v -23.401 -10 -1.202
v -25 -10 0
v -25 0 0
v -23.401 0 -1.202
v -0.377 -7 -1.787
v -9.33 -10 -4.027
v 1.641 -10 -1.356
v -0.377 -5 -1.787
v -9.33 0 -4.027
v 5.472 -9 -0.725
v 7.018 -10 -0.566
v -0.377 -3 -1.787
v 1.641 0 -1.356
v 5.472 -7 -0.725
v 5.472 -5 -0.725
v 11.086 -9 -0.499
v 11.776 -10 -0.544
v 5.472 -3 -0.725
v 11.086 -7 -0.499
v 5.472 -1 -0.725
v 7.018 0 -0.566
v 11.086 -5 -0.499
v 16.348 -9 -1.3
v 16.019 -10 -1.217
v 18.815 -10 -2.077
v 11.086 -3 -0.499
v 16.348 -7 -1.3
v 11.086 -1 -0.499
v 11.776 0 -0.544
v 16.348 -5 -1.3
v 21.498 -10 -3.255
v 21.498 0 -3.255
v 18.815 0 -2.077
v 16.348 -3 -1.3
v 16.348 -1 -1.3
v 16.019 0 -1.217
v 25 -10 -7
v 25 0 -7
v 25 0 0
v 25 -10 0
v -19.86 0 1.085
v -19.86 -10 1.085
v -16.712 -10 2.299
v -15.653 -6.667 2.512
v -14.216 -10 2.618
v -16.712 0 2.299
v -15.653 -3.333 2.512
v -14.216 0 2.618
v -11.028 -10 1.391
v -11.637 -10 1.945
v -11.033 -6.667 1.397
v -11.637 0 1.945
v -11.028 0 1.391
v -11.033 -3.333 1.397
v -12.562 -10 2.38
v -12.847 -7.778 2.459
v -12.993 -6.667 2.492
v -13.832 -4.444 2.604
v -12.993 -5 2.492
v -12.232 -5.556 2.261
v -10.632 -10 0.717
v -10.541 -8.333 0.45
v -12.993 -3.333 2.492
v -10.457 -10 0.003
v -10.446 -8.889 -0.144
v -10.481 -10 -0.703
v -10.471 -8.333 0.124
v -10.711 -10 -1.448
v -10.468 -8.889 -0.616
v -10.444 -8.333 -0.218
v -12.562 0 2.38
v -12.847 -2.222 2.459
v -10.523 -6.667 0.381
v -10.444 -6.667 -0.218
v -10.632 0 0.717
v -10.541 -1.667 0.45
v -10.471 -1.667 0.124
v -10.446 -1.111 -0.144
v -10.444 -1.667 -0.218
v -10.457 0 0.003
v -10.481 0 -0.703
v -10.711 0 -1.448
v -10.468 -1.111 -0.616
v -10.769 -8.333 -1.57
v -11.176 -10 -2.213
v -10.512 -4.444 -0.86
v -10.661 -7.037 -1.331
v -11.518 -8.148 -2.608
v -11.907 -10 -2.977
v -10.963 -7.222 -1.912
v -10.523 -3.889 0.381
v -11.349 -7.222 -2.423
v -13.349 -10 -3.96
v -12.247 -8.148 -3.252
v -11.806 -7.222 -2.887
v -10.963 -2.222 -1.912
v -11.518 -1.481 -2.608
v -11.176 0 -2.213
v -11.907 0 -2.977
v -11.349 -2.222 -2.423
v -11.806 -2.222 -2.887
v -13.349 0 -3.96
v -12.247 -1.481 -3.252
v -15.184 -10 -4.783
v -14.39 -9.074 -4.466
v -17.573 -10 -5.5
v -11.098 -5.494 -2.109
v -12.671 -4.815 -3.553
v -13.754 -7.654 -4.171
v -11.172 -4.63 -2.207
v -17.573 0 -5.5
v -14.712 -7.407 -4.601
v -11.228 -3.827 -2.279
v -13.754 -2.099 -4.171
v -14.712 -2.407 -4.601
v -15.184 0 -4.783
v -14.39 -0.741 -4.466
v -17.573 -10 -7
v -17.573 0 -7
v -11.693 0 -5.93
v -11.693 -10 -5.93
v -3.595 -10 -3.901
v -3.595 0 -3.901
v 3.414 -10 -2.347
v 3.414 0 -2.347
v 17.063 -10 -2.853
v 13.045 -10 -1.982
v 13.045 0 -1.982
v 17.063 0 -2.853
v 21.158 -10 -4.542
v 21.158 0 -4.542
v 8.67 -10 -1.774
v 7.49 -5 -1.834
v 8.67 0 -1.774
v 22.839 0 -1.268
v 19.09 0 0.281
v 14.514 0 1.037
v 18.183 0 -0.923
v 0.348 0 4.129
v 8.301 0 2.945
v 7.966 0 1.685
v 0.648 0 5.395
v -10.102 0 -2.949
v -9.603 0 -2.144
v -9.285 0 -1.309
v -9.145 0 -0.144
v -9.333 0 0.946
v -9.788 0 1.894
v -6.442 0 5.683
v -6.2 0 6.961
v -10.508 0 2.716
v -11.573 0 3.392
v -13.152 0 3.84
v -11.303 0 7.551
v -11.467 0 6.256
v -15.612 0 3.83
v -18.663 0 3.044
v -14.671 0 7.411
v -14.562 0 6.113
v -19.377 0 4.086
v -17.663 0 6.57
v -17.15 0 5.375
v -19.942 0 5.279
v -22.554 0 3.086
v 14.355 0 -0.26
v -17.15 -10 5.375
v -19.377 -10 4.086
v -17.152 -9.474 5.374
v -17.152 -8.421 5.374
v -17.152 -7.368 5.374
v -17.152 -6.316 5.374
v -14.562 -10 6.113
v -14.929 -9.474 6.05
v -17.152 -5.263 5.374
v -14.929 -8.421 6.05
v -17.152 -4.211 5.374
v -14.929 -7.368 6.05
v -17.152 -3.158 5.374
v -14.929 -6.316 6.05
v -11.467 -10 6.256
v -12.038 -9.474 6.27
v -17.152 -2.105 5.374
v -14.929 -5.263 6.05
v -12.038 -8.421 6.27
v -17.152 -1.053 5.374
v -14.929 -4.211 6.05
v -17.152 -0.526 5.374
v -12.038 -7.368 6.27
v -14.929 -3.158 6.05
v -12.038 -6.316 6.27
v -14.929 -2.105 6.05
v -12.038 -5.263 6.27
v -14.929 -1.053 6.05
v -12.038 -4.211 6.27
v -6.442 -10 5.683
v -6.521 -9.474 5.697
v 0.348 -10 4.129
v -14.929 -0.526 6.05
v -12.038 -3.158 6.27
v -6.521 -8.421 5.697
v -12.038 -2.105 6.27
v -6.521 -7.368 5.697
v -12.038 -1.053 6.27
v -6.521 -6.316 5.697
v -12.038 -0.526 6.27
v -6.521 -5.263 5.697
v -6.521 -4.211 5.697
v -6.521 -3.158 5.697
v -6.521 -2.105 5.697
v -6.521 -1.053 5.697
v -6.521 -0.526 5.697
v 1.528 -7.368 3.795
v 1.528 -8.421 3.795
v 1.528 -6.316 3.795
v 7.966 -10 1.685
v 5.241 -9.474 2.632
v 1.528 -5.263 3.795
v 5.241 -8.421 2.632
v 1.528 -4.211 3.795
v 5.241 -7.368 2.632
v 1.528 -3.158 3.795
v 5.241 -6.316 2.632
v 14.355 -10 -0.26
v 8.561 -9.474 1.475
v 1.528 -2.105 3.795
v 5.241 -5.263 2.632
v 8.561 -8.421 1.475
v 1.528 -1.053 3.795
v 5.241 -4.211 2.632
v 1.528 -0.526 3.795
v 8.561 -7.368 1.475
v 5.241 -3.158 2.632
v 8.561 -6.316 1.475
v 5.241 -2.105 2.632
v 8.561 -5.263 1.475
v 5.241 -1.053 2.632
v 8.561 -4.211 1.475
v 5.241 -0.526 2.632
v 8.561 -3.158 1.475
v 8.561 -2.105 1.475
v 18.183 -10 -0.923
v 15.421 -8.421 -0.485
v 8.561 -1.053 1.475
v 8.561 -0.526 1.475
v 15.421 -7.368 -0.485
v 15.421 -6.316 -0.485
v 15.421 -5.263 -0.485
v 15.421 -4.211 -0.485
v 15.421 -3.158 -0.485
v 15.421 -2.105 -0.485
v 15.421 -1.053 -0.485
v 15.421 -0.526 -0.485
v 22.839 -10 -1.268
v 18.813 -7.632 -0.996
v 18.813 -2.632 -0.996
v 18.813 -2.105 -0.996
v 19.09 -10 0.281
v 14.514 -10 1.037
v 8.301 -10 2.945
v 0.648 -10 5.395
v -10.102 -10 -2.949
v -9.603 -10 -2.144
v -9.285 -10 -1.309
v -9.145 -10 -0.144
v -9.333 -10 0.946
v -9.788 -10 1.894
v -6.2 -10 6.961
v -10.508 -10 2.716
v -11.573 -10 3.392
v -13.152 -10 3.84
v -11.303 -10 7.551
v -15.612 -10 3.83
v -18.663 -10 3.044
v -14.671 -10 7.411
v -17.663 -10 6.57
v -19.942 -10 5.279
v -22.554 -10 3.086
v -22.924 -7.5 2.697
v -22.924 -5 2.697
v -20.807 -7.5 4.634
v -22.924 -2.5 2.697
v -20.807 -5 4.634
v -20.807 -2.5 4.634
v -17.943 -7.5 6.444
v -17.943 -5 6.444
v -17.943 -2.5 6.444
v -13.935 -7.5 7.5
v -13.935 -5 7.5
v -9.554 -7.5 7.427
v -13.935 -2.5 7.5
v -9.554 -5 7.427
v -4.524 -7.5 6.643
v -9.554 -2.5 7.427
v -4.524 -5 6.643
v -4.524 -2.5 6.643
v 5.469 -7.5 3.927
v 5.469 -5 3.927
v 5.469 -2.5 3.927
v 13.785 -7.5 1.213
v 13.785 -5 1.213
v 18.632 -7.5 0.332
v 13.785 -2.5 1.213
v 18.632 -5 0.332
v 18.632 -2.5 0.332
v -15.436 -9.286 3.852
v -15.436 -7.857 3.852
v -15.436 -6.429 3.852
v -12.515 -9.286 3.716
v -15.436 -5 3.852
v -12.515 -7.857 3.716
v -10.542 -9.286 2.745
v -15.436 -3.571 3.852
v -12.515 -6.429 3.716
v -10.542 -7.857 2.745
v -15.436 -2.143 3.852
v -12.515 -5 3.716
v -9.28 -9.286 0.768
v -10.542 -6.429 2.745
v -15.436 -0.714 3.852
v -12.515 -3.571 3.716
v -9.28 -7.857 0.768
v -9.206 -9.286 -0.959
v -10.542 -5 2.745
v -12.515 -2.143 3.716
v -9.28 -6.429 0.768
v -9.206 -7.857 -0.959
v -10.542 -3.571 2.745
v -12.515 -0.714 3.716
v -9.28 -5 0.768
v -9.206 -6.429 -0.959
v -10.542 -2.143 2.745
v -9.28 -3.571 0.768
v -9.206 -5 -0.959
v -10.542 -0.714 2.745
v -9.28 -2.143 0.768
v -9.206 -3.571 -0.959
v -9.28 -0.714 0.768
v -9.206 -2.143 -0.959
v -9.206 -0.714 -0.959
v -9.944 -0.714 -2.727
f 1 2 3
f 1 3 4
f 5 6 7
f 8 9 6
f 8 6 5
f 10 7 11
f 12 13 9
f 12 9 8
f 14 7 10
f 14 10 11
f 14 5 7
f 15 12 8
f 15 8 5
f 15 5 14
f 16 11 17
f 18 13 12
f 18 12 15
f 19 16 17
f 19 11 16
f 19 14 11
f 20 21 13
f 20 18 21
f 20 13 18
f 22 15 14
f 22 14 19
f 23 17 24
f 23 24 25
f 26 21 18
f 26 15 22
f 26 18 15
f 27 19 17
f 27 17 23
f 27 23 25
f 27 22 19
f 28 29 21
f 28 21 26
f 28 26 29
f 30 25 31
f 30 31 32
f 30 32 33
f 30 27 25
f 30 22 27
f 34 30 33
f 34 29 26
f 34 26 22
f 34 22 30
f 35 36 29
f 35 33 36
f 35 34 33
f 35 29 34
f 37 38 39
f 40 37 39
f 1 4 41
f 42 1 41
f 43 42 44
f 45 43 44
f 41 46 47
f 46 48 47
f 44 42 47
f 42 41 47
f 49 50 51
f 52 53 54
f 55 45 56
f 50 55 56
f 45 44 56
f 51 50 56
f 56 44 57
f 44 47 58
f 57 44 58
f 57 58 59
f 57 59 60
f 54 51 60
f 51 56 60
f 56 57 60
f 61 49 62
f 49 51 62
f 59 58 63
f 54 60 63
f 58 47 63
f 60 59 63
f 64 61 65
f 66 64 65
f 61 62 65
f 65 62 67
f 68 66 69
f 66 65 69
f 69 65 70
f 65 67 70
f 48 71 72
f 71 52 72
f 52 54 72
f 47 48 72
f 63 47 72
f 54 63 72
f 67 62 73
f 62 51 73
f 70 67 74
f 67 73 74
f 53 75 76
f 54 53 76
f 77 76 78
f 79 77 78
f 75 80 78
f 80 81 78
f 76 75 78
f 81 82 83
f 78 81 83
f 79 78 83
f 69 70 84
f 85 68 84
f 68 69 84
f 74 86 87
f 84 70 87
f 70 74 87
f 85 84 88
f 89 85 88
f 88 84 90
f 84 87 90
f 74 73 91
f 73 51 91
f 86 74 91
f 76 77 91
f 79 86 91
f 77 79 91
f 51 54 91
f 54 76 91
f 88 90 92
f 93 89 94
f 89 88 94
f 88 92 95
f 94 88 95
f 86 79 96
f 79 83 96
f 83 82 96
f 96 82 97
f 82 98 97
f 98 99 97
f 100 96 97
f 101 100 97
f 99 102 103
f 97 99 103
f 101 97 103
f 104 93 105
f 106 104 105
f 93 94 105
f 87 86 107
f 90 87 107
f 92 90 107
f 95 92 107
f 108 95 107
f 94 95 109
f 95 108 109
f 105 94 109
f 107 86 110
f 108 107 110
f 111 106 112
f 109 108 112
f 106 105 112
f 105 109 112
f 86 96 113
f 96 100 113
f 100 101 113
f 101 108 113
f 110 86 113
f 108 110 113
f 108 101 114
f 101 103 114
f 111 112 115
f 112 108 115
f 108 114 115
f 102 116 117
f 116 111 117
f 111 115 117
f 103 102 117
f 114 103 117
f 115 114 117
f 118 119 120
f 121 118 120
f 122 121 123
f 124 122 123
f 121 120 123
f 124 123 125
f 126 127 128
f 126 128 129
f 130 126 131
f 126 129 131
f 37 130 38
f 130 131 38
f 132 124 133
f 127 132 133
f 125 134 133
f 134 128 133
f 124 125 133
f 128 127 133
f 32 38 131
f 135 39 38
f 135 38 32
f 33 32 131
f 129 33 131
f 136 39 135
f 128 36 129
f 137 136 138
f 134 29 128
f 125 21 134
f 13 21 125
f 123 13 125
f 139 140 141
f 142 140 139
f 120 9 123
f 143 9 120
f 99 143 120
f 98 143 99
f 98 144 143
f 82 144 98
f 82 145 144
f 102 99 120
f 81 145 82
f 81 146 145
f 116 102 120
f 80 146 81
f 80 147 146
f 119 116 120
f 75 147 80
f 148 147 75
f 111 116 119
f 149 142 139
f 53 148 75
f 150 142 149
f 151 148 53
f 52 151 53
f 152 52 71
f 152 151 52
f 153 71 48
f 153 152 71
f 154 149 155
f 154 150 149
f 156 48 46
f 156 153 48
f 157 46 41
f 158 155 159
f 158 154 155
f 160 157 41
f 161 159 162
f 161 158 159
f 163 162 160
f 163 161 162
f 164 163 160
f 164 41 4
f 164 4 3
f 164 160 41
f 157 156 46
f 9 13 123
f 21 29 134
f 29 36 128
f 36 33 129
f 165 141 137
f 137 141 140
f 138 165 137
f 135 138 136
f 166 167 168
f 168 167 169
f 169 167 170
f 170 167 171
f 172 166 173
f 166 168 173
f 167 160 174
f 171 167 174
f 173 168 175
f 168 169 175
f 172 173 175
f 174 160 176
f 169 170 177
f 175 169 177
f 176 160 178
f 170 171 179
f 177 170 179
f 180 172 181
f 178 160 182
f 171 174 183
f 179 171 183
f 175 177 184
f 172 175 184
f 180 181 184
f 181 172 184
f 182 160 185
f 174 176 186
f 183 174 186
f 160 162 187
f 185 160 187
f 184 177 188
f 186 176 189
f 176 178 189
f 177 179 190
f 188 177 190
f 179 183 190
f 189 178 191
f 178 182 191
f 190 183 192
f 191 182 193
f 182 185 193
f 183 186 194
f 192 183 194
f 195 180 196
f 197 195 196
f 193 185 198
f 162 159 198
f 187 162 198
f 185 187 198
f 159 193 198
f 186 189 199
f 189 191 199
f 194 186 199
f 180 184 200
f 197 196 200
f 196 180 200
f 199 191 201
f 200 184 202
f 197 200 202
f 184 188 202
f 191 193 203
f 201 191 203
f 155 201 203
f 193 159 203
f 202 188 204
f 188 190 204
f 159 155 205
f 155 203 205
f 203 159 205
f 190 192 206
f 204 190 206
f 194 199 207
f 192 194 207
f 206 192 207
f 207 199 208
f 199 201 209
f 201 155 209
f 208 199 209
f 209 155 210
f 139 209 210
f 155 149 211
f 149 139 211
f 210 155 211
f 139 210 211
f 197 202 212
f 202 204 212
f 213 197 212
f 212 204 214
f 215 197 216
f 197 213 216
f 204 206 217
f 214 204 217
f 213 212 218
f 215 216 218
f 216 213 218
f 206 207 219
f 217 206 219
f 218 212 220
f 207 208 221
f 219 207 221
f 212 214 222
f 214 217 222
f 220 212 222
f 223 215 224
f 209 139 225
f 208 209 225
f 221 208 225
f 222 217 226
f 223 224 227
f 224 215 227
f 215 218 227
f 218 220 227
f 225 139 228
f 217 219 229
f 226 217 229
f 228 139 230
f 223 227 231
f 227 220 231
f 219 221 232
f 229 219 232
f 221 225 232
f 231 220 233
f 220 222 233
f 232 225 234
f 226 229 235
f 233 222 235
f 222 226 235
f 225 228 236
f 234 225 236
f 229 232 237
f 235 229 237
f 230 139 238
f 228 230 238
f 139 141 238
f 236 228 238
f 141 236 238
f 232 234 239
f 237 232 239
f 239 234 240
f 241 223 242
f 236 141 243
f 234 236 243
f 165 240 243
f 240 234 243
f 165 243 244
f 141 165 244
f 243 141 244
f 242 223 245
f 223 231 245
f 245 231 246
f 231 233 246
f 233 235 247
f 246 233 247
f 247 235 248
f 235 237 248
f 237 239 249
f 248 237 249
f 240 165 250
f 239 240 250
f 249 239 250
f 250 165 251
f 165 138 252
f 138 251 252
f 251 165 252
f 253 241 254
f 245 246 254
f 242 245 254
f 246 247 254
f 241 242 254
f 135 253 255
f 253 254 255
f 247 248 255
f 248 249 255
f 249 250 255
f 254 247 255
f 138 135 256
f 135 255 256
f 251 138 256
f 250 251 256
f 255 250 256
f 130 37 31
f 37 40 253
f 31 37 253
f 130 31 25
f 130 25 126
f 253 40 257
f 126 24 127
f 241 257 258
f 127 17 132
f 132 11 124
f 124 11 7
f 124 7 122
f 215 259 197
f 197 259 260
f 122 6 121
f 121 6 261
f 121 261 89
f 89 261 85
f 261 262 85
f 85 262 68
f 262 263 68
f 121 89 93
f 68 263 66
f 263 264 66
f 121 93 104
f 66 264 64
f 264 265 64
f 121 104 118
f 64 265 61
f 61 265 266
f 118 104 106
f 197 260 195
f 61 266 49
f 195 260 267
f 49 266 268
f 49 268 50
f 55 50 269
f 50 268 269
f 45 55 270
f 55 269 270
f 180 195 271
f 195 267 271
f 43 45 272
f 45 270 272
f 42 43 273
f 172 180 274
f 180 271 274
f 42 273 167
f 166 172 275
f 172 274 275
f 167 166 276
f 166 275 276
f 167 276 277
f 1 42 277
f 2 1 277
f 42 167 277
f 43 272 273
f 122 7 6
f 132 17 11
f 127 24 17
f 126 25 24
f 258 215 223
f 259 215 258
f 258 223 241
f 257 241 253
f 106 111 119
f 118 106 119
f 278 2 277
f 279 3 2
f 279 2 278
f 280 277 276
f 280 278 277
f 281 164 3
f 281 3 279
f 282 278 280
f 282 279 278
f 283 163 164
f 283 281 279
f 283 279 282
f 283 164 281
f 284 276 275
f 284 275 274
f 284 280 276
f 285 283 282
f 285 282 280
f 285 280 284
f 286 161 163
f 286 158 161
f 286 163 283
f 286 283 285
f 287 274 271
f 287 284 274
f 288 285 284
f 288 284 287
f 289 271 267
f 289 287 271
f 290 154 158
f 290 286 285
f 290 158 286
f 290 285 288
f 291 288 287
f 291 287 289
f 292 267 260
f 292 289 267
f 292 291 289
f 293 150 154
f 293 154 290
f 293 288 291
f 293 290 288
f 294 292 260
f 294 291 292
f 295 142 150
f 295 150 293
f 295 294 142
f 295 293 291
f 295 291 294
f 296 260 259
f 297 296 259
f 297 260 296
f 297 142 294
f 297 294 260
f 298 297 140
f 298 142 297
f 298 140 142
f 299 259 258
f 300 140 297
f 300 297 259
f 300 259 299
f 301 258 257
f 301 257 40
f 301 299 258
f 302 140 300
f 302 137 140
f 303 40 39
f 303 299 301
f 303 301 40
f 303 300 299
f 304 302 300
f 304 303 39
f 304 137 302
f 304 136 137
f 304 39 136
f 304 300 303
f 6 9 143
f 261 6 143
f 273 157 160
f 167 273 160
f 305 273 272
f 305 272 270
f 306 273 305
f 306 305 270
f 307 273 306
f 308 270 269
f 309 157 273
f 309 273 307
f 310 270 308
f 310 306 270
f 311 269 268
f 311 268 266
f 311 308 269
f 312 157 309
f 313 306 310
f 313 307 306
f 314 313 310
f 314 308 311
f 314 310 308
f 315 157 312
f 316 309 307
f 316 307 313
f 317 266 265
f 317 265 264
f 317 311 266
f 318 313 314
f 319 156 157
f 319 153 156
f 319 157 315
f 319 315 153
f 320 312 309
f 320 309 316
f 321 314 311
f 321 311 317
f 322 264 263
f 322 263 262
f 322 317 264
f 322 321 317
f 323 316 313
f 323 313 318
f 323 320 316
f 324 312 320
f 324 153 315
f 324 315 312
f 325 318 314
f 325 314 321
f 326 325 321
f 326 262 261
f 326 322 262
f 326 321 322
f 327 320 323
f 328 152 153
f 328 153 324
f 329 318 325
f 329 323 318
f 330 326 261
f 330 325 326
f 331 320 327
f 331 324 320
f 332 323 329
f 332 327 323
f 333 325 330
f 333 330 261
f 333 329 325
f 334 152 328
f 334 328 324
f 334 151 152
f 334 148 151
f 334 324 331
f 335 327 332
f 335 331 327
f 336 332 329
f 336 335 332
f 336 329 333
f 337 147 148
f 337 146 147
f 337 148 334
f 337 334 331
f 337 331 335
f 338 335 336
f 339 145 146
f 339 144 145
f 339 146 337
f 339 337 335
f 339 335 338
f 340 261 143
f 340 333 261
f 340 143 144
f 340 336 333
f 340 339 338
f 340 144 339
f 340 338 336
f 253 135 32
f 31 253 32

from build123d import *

# Parameters (mm, degrees)
F1_DEPTH = 10


# Not quite as in the source:
# - ends of sketch curves that miss each other by under 0.0002 mm in the source are joined
# - the dataset's text gives a spline's control points without its knots; the knots are read off the source's solid


with BuildPart() as f1:
    # F0 (on Front) → F1 (new body)
    with BuildSketch(Plane.XZ):
        with BuildLine():
            add(Edge.make_bspline(
                [(-25, 0), (-23.5353633761, 2.2088184487), (-21.0062414356, 4.7820689833), (-13.8192409759, 9.2564060733), (7.7997359992, 3.8412558696), (15.1413595304, 0), (25, 0)],
                knots=[0, 0, 0, 0, 0.176877597, 0.369937696, 0.6842072965, 1, 1, 1, 1], degree=3))
            Line((-25, 0), (-23.4013824598, -1.2018410711))
            add(Edge.make_bspline(
                [(-23.4013824598, -1.2018410711), (-20.7961176234, 0.8105589099), (-16.2151711553, 3.1186773641), (-9.4114614583, 2.2080487325), (-10.1234289262, -3.6913444212), (-17.5727587193, -5.5)],
                knots=[0, 0, 0, 0, 0.3577339943, 0.6237725059, 1, 1, 1, 1], degree=3))
            Line((-17.5727587193, -5.5), (-17.5727587193, -7))
            add(Edge.make_bspline(
                [(-17.5727587193, -7), (-9.5416165347, -6.0225988186), (7.3368503694, 0.6895433506), (19.9003461748, -3.1075021252), (25, -7)],
                knots=[0, 0, 0, 0, 0.5421146173, 1, 1, 1, 1], degree=3))
            Line((25, -7), (25, 0))
        make_face()
        with BuildLine():
            Line((-18.6626309713, 3.0437360985), (-19.37718185, 4.085818865))
            add(Edge.make_bspline(
                [(-19.37718185, 4.085818865), (-19.2351469903, 4.1884605588), (-18.8222001915, 4.476962296), (-18.1021841377, 4.9225532755), (-17.1701670507, 5.3871128646), (-16.1314871306, 5.7748903375), (-14.9555077334, 6.0692782464), (-13.6178958905, 6.247793332), (-12.0666825691, 6.2914734797), (-9.766124237, 6.1813777311), (-6.5603478578, 5.7549083191), (-2.4752672416, 4.8953532484), (0.9014991571, 3.9920741444), (3.4564214075, 3.2193291581), (5.26222423, 2.6315789588), (6.9431379993, 2.0470359162), (9.1025443307, 1.2805575784), (11.7720133473, 0.3721732526), (15.3081169524, -0.5345270337), (18.9866204844, -1.0692247139), (21.7134251241, -1.2326363335), (22.8392417874, -1.2675846816)],
                knots=[0.2019930137, 0.2019930137, 0.2019930137, 0.2019930137, 0.21875, 0.25, 0.28125, 0.3125, 0.34375, 0.375, 0.40625, 0.4375, 0.5, 0.5625, 0.625, 0.65625, 0.6875, 0.71875, 0.75, 0.8125, 0.875, 0.9375, 0.9762819293, 0.9762819293, 0.9762819293, 0.9762819293], degree=3))
            Line((22.8392417874, -1.2675846816), (21.4982855177, -3.2547442942))
            add(Edge.make_bspline(
                [(-9.3299190223, -4.026907105), (-8.3286212906, -3.7769416853), (-5.3537756133, -3.0091078031), (-1.3560313783, -1.9756906659), (2.573556358, -1.1515681653), (5.4810935362, -0.6888547782), (8.3362134892, -0.4422460036), (11.1009276127, -0.4565682672), (13.7766541289, -0.7274180604), (17.2253435912, -1.4336165841), (19.7627439648, -2.3827163169), (21.4155417012, -3.2126347425), (21.4982855177, -3.2547442942)],
                knots=[0.1858417609, 0.1858417609, 0.1858417609, 0.1858417609, 0.25, 0.375, 0.4375, 0.5, 0.5625, 0.625, 0.6875, 0.75, 0.875, 0.8816021473, 0.8816021473, 0.8816021473, 0.8816021473], degree=3))
            Line((-9.3299190223, -4.026907105), (-10.1023896224, -2.948806003))
            add(Edge.make_bspline(
                [(-18.6626309713, 3.0437360985), (-18.5725818066, 3.0780117008), (-17.99215712, 3.2926858769), (-16.9176681891, 3.6175018842), (-15.4366583445, 3.8846431492), (-13.9518702414, 3.9539138632), (-12.5024766902, 3.7725777912), (-11.354806853, 3.3399679954), (-10.5294772781, 2.7650699008), (-9.8062415879, 2.0269023954), (-9.2987612179, 1.0630274045), (-9.1161197289, -0.0633099369), (-9.1716226788, -0.9572739007), (-9.435887283, -1.860198698), (-9.7938332887, -2.5206201828), (-10.0472997743, -2.8755973617), (-10.1023896224, -2.948806003)],
                knots=[0.2385136662, 0.2385136662, 0.2385136662, 0.2385136662, 0.25, 0.3125, 0.375, 0.4375, 0.5, 0.5625, 0.59375, 0.625, 0.6875, 0.71875, 0.75, 0.78125, 0.8125, 0.8207073926, 0.8207073926, 0.8207073926, 0.8207073926], degree=3))
        make_face(mode=Mode.SUBTRACT)
    extrude(amount=F1_DEPTH)


solid = f1.part
